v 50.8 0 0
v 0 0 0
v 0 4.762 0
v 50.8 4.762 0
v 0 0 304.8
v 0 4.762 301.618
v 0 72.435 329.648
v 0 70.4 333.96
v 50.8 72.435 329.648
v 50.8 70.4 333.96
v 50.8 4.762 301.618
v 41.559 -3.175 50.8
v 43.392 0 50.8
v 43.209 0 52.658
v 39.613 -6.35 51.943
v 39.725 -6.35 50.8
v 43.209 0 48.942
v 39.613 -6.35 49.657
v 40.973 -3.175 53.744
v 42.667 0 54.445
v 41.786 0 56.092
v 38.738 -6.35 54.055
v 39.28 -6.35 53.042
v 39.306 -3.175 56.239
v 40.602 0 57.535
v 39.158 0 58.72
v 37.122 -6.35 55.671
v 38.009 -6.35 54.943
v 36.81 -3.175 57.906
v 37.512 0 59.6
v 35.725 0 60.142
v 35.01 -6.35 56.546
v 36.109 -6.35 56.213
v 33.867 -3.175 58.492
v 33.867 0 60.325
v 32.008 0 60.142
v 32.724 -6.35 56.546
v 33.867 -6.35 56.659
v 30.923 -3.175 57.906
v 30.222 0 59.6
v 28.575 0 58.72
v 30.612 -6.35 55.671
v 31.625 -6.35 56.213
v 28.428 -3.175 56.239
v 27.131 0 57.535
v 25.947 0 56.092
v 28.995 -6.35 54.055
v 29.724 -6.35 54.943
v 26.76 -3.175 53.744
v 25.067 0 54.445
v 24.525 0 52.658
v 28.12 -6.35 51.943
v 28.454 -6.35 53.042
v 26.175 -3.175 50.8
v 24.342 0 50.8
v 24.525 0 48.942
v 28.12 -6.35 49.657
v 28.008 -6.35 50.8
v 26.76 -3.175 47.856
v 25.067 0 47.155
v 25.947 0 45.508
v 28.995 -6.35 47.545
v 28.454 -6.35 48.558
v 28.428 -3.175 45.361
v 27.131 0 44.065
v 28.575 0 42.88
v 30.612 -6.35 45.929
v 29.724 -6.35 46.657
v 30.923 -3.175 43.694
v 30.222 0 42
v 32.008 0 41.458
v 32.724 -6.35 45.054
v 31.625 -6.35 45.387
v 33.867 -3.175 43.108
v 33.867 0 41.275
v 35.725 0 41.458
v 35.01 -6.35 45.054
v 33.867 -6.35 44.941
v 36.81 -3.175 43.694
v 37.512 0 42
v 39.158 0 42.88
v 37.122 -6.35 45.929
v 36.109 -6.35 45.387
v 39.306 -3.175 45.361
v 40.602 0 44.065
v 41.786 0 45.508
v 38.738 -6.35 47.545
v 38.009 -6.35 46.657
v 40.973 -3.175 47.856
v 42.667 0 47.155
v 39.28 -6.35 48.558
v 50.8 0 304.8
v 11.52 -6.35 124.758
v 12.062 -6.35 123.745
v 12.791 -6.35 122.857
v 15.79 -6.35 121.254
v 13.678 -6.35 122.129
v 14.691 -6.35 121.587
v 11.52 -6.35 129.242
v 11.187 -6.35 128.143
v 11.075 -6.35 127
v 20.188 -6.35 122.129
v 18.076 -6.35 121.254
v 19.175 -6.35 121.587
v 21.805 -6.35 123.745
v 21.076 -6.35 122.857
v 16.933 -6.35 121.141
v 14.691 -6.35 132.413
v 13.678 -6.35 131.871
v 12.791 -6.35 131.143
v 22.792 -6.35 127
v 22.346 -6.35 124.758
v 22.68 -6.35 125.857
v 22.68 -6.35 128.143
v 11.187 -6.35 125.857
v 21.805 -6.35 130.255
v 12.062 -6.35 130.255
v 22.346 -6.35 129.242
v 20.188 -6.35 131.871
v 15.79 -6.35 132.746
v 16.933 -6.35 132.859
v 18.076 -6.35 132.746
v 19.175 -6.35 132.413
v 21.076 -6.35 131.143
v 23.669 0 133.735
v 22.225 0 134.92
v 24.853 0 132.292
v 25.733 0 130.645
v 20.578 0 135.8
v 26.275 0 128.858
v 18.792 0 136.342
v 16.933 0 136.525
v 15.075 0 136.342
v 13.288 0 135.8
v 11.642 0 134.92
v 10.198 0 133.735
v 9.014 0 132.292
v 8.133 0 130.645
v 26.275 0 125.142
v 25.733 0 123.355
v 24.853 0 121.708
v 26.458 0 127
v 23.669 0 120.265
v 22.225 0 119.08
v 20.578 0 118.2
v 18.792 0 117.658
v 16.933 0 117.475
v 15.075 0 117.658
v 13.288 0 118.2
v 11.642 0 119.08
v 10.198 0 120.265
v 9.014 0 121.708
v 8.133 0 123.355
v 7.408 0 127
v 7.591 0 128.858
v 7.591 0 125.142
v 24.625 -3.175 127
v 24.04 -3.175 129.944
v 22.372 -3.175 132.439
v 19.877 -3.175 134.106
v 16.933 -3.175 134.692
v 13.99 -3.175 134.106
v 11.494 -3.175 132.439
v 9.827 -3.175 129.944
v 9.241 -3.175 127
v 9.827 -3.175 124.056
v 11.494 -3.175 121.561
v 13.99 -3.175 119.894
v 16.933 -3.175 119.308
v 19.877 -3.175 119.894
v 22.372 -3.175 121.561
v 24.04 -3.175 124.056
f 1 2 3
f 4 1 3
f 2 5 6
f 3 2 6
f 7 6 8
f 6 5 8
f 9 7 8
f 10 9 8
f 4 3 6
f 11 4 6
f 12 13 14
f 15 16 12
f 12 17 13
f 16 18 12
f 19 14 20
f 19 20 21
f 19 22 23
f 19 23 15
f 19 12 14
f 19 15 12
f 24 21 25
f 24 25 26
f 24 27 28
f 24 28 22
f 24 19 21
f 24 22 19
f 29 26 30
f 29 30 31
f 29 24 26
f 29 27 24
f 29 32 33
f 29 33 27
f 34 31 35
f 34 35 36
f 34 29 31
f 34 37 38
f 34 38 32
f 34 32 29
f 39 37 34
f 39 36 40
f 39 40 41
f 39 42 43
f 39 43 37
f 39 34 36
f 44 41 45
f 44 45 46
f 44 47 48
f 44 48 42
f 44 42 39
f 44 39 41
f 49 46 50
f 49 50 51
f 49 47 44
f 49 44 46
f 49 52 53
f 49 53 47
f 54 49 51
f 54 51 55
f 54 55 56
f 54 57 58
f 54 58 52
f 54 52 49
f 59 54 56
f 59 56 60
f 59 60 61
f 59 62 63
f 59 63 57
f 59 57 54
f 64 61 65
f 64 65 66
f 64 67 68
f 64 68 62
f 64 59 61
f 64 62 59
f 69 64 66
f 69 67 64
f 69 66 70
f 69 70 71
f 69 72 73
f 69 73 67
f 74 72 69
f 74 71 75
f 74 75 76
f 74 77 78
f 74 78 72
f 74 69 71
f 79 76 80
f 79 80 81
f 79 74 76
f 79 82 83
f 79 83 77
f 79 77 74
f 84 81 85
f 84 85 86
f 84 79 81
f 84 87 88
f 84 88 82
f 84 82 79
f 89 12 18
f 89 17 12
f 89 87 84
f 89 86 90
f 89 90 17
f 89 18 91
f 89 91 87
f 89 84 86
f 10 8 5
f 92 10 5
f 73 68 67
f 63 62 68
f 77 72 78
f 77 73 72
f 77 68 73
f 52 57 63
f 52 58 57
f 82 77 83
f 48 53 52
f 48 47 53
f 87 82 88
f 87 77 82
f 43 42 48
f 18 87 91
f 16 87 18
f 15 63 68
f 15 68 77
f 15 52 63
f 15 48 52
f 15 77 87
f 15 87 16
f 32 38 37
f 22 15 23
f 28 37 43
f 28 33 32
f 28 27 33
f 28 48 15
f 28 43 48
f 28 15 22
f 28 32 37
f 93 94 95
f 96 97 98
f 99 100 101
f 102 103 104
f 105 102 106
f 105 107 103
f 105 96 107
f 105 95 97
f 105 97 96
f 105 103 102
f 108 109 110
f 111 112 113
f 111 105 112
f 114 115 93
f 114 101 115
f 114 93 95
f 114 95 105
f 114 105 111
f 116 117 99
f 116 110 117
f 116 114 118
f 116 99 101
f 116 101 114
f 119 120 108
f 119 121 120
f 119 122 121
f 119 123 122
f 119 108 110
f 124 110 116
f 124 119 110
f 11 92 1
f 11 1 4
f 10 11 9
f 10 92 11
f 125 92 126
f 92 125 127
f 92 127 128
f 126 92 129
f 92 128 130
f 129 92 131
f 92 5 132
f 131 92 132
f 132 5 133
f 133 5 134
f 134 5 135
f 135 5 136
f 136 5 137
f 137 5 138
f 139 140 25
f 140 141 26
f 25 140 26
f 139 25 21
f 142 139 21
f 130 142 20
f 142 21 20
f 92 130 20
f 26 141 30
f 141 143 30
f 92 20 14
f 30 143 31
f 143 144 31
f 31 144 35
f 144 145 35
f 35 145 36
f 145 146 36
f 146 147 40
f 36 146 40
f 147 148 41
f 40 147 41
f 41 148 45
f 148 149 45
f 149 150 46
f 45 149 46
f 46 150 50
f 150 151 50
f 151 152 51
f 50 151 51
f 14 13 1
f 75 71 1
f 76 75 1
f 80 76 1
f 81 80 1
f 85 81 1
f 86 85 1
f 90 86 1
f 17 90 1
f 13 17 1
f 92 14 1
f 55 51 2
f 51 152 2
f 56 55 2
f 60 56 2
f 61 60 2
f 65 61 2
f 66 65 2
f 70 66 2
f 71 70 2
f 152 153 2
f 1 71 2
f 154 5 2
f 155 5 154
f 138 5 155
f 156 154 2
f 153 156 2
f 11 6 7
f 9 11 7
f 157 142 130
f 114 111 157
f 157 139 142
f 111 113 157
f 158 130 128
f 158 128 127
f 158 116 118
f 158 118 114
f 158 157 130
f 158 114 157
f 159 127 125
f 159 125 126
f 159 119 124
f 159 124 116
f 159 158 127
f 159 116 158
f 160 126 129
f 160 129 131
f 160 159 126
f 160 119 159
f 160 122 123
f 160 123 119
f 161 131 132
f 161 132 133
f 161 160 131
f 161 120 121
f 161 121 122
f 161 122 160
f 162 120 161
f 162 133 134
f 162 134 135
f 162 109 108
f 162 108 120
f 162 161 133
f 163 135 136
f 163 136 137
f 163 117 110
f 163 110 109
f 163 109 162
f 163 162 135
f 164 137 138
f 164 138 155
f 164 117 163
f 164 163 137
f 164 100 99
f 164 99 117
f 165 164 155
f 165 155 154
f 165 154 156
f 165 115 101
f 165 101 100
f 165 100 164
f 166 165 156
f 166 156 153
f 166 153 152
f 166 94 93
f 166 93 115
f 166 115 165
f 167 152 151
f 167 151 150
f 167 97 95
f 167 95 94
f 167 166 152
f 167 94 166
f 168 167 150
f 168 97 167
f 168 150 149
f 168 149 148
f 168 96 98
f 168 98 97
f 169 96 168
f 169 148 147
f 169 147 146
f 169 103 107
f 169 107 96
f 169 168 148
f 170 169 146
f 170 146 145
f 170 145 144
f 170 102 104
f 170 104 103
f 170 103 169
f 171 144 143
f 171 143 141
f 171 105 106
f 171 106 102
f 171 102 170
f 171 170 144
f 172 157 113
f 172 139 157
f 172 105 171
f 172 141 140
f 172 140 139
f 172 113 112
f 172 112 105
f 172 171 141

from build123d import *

# Parameters (mm, degrees)
F1_DEPTH = 50.8
F2_R     = 9.525
F3_DEPTH = 6.35
F3_TAPER = 30


# Not quite as in the source:
# - a feature names something its author has since deleted; it is built from what else it names


with BuildPart() as f1:
    # F0 (on Right) → F1 (new body)
    with BuildSketch(Plane.YZ):
        Polygon((0, 304.8), (0, 0), (4.7625, 0), (4.7625, 301.6177992369), (72.4345492237, 329.6484798189), (70.3996203774, 333.9604775462), align=None)
    extrude(amount=F1_DEPTH)

    # F2 (on face) → F3 (join)
    with BuildSketch(Plane.XZ):
        with Locations((16.9333333333, 127)):
            Circle(F2_R)
        with Locations((33.8666666667, 50.8)):
            Circle(F2_R)
    extrude(amount=F3_DEPTH, taper=F3_TAPER)


solid = f1.part
